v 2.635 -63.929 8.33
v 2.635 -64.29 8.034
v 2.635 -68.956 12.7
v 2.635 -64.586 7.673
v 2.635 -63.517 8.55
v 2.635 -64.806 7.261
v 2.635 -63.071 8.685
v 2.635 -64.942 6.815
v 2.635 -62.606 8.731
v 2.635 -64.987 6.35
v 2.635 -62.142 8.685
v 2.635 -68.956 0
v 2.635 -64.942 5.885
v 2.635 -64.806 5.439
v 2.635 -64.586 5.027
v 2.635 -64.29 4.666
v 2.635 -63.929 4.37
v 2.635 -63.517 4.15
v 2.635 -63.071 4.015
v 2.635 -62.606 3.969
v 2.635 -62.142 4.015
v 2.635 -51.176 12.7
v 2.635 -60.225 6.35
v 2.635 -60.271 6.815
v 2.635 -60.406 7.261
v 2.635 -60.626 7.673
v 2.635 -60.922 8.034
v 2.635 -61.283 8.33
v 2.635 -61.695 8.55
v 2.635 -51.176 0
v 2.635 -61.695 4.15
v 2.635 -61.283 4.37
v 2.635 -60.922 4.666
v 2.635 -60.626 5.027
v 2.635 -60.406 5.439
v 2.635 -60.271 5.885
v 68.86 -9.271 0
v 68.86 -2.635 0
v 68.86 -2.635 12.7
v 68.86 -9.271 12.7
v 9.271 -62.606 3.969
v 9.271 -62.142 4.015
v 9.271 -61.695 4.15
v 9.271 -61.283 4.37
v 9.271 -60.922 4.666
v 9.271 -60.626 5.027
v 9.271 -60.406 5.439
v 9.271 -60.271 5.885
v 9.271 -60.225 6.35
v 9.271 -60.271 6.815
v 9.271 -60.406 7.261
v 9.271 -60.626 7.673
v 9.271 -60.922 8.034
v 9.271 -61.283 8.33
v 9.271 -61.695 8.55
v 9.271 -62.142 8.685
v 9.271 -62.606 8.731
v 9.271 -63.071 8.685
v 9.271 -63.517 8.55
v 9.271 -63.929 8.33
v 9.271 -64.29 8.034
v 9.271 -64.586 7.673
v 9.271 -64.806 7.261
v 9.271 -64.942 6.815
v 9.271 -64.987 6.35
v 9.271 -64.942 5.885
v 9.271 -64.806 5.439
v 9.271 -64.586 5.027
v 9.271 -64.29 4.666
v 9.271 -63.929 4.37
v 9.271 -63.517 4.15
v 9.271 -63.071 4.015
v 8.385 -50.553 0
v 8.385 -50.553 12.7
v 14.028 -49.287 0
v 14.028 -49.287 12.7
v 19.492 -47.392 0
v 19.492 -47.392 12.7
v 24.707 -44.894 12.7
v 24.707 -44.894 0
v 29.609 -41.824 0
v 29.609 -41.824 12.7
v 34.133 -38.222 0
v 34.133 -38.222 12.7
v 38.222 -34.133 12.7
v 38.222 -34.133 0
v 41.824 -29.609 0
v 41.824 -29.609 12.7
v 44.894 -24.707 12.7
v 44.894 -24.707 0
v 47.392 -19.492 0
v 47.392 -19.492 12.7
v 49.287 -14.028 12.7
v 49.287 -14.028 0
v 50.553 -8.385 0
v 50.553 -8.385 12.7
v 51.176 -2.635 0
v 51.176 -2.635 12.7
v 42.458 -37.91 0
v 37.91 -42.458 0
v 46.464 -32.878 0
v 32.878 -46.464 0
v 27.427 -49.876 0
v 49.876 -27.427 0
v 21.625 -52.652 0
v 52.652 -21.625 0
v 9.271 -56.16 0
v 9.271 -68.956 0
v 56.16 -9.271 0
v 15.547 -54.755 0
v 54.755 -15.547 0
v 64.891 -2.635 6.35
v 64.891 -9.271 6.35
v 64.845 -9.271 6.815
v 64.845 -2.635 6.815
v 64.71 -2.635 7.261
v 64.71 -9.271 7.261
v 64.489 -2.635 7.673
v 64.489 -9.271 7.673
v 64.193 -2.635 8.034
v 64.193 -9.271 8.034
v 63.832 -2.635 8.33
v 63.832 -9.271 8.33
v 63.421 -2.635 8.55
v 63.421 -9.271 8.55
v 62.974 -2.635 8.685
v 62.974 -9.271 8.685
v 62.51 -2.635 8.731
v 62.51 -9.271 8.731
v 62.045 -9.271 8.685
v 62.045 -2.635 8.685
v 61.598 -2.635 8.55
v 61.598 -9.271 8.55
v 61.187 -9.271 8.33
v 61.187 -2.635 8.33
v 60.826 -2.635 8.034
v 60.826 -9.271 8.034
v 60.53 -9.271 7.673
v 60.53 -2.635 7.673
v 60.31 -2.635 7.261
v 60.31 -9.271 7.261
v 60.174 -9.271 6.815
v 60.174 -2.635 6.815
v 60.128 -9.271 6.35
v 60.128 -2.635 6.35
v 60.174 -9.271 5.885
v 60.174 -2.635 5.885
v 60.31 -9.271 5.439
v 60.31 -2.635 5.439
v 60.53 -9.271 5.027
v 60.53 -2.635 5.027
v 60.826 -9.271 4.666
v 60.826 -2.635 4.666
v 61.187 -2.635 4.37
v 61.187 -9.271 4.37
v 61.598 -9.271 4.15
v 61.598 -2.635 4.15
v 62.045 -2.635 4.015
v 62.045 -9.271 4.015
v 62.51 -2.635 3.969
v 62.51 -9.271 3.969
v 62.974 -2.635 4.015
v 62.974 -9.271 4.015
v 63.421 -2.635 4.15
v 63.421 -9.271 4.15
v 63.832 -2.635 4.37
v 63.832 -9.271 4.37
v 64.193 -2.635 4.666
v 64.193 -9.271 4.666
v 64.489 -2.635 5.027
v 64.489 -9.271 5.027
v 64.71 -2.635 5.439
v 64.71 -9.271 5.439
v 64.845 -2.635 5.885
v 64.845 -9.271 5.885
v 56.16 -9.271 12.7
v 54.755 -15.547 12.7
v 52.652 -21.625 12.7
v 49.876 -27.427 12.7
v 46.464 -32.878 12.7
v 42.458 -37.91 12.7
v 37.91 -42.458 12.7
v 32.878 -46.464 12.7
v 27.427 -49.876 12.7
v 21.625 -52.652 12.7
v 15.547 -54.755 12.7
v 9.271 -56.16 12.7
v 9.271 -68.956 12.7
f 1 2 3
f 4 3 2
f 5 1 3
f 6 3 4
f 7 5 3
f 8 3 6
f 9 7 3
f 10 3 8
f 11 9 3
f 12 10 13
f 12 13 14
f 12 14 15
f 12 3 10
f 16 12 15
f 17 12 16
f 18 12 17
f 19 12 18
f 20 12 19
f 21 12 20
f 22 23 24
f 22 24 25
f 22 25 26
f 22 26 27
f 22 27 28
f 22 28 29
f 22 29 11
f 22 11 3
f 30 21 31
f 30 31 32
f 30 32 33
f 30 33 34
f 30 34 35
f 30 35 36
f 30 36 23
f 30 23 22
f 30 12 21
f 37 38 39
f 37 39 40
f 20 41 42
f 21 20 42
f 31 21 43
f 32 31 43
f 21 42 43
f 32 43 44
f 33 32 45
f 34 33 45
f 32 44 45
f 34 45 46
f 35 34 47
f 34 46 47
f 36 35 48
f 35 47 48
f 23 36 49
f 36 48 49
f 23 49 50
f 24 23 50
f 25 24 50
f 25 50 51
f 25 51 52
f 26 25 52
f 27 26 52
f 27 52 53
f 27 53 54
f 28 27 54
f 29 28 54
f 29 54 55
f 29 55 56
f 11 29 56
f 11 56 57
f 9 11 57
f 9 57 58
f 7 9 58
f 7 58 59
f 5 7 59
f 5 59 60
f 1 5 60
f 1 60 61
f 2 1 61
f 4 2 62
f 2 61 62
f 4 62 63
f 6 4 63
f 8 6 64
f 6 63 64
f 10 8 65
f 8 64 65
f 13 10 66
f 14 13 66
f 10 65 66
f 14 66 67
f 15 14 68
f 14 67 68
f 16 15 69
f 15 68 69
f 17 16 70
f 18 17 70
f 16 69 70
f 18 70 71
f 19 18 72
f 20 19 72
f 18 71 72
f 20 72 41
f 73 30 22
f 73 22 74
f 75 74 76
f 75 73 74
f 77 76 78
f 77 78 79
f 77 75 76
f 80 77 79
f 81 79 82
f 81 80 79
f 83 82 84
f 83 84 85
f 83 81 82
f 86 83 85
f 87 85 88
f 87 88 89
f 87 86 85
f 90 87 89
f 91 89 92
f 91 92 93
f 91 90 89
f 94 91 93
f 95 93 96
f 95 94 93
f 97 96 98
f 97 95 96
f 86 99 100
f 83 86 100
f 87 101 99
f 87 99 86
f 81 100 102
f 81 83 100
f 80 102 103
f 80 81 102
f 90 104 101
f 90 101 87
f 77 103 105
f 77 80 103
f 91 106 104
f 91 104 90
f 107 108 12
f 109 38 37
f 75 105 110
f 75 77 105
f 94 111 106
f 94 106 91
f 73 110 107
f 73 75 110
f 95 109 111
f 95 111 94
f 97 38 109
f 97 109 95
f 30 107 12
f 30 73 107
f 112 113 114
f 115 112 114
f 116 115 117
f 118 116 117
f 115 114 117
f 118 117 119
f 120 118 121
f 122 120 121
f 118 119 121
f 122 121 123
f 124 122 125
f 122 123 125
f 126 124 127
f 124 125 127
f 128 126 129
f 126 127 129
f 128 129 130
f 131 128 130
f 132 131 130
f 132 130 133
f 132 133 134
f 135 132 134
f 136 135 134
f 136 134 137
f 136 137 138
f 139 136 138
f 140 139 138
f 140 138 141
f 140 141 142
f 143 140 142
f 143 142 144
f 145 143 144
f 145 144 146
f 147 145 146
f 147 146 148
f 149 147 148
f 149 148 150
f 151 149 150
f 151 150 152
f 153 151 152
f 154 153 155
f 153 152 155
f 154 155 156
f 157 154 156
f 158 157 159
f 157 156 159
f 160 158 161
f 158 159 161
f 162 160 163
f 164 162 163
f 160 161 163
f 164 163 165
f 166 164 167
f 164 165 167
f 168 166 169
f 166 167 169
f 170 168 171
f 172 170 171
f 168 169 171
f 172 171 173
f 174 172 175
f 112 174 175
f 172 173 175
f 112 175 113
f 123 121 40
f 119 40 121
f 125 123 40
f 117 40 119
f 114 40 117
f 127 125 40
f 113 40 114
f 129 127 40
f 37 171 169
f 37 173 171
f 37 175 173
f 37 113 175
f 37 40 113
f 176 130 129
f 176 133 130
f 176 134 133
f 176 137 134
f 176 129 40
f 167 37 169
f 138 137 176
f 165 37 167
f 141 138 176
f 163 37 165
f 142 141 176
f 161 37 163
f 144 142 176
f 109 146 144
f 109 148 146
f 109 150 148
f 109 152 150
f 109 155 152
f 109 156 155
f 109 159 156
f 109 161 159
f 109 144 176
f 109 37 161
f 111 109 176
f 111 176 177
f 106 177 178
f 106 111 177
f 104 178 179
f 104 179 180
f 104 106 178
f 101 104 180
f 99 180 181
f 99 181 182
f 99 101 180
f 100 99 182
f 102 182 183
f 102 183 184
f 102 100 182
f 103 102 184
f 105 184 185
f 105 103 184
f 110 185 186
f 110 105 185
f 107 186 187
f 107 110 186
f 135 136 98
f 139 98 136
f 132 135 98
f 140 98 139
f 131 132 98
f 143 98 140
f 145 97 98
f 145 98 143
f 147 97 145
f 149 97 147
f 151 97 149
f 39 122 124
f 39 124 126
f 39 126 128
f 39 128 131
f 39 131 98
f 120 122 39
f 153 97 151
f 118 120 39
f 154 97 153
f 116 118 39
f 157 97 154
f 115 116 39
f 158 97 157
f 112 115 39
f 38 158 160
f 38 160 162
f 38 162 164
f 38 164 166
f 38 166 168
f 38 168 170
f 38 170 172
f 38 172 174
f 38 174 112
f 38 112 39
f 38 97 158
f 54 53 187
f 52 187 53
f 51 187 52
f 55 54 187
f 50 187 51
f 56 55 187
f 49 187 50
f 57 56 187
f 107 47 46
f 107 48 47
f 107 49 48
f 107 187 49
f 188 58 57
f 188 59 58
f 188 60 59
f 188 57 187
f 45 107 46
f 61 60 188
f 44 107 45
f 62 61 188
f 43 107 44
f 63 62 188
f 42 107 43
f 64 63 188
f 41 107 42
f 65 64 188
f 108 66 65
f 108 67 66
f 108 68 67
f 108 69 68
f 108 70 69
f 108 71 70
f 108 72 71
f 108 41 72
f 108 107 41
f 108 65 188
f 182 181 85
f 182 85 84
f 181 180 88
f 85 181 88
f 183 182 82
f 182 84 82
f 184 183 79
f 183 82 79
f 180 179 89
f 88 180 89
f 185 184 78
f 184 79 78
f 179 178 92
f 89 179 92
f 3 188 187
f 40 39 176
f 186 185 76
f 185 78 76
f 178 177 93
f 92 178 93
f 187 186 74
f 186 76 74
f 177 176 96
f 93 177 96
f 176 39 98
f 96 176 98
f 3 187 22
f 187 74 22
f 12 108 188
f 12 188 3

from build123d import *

# Parameters (mm, degrees)
BOSS_EXTRUDE3_DEPTH = 12.7
SKETCH2_R           = 2.38125
CUT_EXTRUDE1_DEPTH  = 7.63575
SKETCH3_R           = 2.38125
CUT_EXTRUDE2_DEPTH  = 7.63575


with BuildPart() as part:
    # Sketch1 → Boss-Extrude3 (new body)
    with BuildSketch(Plane.XY):
        with BuildLine():
            Line((51.176153738, -2.63525), (68.859545977, -2.63525))
            Line((68.859545977, -2.63525), (68.859545977, -9.271))
            Line((68.859545977, -9.271), (56.159545977, -9.271))
            ThreePointArc((56.159545977, -9.271), (40.248267325, -40.248267325), (9.271, -56.159545977))
            Line((9.271, -56.159545977), (9.271, -68.956153738))
            Line((9.271, -68.956153738), (2.63525, -68.956153738))
            Line((2.63525, -68.956153738), (2.63525, -51.176153738))
            ThreePointArc((2.63525, -51.176153738), (36.234950351, -36.234950351), (51.176153738, -2.63525))
        make_face()
    extrude(amount=BOSS_EXTRUDE3_DEPTH)

    # Sketch2 → Cut-Extrude1 (cut, through all)
    with BuildSketch(Plane(origin=(9.271, 0, 0), x_dir=(0, 0, -1), z_dir=(1, 0, 0))):
        with Locations((-6.35, -62.606153738)):
            Circle(SKETCH2_R)
    extrude(amount=-CUT_EXTRUDE1_DEPTH, mode=Mode.SUBTRACT)

    # Sketch3 → Cut-Extrude2 (cut, through all)
    with BuildSketch(Plane.XZ.offset(9.271)):
        with Locations((62.509545977, 6.35)):
            Circle(SKETCH3_R)
    extrude(amount=-CUT_EXTRUDE2_DEPTH, mode=Mode.SUBTRACT)


solid = part.part
